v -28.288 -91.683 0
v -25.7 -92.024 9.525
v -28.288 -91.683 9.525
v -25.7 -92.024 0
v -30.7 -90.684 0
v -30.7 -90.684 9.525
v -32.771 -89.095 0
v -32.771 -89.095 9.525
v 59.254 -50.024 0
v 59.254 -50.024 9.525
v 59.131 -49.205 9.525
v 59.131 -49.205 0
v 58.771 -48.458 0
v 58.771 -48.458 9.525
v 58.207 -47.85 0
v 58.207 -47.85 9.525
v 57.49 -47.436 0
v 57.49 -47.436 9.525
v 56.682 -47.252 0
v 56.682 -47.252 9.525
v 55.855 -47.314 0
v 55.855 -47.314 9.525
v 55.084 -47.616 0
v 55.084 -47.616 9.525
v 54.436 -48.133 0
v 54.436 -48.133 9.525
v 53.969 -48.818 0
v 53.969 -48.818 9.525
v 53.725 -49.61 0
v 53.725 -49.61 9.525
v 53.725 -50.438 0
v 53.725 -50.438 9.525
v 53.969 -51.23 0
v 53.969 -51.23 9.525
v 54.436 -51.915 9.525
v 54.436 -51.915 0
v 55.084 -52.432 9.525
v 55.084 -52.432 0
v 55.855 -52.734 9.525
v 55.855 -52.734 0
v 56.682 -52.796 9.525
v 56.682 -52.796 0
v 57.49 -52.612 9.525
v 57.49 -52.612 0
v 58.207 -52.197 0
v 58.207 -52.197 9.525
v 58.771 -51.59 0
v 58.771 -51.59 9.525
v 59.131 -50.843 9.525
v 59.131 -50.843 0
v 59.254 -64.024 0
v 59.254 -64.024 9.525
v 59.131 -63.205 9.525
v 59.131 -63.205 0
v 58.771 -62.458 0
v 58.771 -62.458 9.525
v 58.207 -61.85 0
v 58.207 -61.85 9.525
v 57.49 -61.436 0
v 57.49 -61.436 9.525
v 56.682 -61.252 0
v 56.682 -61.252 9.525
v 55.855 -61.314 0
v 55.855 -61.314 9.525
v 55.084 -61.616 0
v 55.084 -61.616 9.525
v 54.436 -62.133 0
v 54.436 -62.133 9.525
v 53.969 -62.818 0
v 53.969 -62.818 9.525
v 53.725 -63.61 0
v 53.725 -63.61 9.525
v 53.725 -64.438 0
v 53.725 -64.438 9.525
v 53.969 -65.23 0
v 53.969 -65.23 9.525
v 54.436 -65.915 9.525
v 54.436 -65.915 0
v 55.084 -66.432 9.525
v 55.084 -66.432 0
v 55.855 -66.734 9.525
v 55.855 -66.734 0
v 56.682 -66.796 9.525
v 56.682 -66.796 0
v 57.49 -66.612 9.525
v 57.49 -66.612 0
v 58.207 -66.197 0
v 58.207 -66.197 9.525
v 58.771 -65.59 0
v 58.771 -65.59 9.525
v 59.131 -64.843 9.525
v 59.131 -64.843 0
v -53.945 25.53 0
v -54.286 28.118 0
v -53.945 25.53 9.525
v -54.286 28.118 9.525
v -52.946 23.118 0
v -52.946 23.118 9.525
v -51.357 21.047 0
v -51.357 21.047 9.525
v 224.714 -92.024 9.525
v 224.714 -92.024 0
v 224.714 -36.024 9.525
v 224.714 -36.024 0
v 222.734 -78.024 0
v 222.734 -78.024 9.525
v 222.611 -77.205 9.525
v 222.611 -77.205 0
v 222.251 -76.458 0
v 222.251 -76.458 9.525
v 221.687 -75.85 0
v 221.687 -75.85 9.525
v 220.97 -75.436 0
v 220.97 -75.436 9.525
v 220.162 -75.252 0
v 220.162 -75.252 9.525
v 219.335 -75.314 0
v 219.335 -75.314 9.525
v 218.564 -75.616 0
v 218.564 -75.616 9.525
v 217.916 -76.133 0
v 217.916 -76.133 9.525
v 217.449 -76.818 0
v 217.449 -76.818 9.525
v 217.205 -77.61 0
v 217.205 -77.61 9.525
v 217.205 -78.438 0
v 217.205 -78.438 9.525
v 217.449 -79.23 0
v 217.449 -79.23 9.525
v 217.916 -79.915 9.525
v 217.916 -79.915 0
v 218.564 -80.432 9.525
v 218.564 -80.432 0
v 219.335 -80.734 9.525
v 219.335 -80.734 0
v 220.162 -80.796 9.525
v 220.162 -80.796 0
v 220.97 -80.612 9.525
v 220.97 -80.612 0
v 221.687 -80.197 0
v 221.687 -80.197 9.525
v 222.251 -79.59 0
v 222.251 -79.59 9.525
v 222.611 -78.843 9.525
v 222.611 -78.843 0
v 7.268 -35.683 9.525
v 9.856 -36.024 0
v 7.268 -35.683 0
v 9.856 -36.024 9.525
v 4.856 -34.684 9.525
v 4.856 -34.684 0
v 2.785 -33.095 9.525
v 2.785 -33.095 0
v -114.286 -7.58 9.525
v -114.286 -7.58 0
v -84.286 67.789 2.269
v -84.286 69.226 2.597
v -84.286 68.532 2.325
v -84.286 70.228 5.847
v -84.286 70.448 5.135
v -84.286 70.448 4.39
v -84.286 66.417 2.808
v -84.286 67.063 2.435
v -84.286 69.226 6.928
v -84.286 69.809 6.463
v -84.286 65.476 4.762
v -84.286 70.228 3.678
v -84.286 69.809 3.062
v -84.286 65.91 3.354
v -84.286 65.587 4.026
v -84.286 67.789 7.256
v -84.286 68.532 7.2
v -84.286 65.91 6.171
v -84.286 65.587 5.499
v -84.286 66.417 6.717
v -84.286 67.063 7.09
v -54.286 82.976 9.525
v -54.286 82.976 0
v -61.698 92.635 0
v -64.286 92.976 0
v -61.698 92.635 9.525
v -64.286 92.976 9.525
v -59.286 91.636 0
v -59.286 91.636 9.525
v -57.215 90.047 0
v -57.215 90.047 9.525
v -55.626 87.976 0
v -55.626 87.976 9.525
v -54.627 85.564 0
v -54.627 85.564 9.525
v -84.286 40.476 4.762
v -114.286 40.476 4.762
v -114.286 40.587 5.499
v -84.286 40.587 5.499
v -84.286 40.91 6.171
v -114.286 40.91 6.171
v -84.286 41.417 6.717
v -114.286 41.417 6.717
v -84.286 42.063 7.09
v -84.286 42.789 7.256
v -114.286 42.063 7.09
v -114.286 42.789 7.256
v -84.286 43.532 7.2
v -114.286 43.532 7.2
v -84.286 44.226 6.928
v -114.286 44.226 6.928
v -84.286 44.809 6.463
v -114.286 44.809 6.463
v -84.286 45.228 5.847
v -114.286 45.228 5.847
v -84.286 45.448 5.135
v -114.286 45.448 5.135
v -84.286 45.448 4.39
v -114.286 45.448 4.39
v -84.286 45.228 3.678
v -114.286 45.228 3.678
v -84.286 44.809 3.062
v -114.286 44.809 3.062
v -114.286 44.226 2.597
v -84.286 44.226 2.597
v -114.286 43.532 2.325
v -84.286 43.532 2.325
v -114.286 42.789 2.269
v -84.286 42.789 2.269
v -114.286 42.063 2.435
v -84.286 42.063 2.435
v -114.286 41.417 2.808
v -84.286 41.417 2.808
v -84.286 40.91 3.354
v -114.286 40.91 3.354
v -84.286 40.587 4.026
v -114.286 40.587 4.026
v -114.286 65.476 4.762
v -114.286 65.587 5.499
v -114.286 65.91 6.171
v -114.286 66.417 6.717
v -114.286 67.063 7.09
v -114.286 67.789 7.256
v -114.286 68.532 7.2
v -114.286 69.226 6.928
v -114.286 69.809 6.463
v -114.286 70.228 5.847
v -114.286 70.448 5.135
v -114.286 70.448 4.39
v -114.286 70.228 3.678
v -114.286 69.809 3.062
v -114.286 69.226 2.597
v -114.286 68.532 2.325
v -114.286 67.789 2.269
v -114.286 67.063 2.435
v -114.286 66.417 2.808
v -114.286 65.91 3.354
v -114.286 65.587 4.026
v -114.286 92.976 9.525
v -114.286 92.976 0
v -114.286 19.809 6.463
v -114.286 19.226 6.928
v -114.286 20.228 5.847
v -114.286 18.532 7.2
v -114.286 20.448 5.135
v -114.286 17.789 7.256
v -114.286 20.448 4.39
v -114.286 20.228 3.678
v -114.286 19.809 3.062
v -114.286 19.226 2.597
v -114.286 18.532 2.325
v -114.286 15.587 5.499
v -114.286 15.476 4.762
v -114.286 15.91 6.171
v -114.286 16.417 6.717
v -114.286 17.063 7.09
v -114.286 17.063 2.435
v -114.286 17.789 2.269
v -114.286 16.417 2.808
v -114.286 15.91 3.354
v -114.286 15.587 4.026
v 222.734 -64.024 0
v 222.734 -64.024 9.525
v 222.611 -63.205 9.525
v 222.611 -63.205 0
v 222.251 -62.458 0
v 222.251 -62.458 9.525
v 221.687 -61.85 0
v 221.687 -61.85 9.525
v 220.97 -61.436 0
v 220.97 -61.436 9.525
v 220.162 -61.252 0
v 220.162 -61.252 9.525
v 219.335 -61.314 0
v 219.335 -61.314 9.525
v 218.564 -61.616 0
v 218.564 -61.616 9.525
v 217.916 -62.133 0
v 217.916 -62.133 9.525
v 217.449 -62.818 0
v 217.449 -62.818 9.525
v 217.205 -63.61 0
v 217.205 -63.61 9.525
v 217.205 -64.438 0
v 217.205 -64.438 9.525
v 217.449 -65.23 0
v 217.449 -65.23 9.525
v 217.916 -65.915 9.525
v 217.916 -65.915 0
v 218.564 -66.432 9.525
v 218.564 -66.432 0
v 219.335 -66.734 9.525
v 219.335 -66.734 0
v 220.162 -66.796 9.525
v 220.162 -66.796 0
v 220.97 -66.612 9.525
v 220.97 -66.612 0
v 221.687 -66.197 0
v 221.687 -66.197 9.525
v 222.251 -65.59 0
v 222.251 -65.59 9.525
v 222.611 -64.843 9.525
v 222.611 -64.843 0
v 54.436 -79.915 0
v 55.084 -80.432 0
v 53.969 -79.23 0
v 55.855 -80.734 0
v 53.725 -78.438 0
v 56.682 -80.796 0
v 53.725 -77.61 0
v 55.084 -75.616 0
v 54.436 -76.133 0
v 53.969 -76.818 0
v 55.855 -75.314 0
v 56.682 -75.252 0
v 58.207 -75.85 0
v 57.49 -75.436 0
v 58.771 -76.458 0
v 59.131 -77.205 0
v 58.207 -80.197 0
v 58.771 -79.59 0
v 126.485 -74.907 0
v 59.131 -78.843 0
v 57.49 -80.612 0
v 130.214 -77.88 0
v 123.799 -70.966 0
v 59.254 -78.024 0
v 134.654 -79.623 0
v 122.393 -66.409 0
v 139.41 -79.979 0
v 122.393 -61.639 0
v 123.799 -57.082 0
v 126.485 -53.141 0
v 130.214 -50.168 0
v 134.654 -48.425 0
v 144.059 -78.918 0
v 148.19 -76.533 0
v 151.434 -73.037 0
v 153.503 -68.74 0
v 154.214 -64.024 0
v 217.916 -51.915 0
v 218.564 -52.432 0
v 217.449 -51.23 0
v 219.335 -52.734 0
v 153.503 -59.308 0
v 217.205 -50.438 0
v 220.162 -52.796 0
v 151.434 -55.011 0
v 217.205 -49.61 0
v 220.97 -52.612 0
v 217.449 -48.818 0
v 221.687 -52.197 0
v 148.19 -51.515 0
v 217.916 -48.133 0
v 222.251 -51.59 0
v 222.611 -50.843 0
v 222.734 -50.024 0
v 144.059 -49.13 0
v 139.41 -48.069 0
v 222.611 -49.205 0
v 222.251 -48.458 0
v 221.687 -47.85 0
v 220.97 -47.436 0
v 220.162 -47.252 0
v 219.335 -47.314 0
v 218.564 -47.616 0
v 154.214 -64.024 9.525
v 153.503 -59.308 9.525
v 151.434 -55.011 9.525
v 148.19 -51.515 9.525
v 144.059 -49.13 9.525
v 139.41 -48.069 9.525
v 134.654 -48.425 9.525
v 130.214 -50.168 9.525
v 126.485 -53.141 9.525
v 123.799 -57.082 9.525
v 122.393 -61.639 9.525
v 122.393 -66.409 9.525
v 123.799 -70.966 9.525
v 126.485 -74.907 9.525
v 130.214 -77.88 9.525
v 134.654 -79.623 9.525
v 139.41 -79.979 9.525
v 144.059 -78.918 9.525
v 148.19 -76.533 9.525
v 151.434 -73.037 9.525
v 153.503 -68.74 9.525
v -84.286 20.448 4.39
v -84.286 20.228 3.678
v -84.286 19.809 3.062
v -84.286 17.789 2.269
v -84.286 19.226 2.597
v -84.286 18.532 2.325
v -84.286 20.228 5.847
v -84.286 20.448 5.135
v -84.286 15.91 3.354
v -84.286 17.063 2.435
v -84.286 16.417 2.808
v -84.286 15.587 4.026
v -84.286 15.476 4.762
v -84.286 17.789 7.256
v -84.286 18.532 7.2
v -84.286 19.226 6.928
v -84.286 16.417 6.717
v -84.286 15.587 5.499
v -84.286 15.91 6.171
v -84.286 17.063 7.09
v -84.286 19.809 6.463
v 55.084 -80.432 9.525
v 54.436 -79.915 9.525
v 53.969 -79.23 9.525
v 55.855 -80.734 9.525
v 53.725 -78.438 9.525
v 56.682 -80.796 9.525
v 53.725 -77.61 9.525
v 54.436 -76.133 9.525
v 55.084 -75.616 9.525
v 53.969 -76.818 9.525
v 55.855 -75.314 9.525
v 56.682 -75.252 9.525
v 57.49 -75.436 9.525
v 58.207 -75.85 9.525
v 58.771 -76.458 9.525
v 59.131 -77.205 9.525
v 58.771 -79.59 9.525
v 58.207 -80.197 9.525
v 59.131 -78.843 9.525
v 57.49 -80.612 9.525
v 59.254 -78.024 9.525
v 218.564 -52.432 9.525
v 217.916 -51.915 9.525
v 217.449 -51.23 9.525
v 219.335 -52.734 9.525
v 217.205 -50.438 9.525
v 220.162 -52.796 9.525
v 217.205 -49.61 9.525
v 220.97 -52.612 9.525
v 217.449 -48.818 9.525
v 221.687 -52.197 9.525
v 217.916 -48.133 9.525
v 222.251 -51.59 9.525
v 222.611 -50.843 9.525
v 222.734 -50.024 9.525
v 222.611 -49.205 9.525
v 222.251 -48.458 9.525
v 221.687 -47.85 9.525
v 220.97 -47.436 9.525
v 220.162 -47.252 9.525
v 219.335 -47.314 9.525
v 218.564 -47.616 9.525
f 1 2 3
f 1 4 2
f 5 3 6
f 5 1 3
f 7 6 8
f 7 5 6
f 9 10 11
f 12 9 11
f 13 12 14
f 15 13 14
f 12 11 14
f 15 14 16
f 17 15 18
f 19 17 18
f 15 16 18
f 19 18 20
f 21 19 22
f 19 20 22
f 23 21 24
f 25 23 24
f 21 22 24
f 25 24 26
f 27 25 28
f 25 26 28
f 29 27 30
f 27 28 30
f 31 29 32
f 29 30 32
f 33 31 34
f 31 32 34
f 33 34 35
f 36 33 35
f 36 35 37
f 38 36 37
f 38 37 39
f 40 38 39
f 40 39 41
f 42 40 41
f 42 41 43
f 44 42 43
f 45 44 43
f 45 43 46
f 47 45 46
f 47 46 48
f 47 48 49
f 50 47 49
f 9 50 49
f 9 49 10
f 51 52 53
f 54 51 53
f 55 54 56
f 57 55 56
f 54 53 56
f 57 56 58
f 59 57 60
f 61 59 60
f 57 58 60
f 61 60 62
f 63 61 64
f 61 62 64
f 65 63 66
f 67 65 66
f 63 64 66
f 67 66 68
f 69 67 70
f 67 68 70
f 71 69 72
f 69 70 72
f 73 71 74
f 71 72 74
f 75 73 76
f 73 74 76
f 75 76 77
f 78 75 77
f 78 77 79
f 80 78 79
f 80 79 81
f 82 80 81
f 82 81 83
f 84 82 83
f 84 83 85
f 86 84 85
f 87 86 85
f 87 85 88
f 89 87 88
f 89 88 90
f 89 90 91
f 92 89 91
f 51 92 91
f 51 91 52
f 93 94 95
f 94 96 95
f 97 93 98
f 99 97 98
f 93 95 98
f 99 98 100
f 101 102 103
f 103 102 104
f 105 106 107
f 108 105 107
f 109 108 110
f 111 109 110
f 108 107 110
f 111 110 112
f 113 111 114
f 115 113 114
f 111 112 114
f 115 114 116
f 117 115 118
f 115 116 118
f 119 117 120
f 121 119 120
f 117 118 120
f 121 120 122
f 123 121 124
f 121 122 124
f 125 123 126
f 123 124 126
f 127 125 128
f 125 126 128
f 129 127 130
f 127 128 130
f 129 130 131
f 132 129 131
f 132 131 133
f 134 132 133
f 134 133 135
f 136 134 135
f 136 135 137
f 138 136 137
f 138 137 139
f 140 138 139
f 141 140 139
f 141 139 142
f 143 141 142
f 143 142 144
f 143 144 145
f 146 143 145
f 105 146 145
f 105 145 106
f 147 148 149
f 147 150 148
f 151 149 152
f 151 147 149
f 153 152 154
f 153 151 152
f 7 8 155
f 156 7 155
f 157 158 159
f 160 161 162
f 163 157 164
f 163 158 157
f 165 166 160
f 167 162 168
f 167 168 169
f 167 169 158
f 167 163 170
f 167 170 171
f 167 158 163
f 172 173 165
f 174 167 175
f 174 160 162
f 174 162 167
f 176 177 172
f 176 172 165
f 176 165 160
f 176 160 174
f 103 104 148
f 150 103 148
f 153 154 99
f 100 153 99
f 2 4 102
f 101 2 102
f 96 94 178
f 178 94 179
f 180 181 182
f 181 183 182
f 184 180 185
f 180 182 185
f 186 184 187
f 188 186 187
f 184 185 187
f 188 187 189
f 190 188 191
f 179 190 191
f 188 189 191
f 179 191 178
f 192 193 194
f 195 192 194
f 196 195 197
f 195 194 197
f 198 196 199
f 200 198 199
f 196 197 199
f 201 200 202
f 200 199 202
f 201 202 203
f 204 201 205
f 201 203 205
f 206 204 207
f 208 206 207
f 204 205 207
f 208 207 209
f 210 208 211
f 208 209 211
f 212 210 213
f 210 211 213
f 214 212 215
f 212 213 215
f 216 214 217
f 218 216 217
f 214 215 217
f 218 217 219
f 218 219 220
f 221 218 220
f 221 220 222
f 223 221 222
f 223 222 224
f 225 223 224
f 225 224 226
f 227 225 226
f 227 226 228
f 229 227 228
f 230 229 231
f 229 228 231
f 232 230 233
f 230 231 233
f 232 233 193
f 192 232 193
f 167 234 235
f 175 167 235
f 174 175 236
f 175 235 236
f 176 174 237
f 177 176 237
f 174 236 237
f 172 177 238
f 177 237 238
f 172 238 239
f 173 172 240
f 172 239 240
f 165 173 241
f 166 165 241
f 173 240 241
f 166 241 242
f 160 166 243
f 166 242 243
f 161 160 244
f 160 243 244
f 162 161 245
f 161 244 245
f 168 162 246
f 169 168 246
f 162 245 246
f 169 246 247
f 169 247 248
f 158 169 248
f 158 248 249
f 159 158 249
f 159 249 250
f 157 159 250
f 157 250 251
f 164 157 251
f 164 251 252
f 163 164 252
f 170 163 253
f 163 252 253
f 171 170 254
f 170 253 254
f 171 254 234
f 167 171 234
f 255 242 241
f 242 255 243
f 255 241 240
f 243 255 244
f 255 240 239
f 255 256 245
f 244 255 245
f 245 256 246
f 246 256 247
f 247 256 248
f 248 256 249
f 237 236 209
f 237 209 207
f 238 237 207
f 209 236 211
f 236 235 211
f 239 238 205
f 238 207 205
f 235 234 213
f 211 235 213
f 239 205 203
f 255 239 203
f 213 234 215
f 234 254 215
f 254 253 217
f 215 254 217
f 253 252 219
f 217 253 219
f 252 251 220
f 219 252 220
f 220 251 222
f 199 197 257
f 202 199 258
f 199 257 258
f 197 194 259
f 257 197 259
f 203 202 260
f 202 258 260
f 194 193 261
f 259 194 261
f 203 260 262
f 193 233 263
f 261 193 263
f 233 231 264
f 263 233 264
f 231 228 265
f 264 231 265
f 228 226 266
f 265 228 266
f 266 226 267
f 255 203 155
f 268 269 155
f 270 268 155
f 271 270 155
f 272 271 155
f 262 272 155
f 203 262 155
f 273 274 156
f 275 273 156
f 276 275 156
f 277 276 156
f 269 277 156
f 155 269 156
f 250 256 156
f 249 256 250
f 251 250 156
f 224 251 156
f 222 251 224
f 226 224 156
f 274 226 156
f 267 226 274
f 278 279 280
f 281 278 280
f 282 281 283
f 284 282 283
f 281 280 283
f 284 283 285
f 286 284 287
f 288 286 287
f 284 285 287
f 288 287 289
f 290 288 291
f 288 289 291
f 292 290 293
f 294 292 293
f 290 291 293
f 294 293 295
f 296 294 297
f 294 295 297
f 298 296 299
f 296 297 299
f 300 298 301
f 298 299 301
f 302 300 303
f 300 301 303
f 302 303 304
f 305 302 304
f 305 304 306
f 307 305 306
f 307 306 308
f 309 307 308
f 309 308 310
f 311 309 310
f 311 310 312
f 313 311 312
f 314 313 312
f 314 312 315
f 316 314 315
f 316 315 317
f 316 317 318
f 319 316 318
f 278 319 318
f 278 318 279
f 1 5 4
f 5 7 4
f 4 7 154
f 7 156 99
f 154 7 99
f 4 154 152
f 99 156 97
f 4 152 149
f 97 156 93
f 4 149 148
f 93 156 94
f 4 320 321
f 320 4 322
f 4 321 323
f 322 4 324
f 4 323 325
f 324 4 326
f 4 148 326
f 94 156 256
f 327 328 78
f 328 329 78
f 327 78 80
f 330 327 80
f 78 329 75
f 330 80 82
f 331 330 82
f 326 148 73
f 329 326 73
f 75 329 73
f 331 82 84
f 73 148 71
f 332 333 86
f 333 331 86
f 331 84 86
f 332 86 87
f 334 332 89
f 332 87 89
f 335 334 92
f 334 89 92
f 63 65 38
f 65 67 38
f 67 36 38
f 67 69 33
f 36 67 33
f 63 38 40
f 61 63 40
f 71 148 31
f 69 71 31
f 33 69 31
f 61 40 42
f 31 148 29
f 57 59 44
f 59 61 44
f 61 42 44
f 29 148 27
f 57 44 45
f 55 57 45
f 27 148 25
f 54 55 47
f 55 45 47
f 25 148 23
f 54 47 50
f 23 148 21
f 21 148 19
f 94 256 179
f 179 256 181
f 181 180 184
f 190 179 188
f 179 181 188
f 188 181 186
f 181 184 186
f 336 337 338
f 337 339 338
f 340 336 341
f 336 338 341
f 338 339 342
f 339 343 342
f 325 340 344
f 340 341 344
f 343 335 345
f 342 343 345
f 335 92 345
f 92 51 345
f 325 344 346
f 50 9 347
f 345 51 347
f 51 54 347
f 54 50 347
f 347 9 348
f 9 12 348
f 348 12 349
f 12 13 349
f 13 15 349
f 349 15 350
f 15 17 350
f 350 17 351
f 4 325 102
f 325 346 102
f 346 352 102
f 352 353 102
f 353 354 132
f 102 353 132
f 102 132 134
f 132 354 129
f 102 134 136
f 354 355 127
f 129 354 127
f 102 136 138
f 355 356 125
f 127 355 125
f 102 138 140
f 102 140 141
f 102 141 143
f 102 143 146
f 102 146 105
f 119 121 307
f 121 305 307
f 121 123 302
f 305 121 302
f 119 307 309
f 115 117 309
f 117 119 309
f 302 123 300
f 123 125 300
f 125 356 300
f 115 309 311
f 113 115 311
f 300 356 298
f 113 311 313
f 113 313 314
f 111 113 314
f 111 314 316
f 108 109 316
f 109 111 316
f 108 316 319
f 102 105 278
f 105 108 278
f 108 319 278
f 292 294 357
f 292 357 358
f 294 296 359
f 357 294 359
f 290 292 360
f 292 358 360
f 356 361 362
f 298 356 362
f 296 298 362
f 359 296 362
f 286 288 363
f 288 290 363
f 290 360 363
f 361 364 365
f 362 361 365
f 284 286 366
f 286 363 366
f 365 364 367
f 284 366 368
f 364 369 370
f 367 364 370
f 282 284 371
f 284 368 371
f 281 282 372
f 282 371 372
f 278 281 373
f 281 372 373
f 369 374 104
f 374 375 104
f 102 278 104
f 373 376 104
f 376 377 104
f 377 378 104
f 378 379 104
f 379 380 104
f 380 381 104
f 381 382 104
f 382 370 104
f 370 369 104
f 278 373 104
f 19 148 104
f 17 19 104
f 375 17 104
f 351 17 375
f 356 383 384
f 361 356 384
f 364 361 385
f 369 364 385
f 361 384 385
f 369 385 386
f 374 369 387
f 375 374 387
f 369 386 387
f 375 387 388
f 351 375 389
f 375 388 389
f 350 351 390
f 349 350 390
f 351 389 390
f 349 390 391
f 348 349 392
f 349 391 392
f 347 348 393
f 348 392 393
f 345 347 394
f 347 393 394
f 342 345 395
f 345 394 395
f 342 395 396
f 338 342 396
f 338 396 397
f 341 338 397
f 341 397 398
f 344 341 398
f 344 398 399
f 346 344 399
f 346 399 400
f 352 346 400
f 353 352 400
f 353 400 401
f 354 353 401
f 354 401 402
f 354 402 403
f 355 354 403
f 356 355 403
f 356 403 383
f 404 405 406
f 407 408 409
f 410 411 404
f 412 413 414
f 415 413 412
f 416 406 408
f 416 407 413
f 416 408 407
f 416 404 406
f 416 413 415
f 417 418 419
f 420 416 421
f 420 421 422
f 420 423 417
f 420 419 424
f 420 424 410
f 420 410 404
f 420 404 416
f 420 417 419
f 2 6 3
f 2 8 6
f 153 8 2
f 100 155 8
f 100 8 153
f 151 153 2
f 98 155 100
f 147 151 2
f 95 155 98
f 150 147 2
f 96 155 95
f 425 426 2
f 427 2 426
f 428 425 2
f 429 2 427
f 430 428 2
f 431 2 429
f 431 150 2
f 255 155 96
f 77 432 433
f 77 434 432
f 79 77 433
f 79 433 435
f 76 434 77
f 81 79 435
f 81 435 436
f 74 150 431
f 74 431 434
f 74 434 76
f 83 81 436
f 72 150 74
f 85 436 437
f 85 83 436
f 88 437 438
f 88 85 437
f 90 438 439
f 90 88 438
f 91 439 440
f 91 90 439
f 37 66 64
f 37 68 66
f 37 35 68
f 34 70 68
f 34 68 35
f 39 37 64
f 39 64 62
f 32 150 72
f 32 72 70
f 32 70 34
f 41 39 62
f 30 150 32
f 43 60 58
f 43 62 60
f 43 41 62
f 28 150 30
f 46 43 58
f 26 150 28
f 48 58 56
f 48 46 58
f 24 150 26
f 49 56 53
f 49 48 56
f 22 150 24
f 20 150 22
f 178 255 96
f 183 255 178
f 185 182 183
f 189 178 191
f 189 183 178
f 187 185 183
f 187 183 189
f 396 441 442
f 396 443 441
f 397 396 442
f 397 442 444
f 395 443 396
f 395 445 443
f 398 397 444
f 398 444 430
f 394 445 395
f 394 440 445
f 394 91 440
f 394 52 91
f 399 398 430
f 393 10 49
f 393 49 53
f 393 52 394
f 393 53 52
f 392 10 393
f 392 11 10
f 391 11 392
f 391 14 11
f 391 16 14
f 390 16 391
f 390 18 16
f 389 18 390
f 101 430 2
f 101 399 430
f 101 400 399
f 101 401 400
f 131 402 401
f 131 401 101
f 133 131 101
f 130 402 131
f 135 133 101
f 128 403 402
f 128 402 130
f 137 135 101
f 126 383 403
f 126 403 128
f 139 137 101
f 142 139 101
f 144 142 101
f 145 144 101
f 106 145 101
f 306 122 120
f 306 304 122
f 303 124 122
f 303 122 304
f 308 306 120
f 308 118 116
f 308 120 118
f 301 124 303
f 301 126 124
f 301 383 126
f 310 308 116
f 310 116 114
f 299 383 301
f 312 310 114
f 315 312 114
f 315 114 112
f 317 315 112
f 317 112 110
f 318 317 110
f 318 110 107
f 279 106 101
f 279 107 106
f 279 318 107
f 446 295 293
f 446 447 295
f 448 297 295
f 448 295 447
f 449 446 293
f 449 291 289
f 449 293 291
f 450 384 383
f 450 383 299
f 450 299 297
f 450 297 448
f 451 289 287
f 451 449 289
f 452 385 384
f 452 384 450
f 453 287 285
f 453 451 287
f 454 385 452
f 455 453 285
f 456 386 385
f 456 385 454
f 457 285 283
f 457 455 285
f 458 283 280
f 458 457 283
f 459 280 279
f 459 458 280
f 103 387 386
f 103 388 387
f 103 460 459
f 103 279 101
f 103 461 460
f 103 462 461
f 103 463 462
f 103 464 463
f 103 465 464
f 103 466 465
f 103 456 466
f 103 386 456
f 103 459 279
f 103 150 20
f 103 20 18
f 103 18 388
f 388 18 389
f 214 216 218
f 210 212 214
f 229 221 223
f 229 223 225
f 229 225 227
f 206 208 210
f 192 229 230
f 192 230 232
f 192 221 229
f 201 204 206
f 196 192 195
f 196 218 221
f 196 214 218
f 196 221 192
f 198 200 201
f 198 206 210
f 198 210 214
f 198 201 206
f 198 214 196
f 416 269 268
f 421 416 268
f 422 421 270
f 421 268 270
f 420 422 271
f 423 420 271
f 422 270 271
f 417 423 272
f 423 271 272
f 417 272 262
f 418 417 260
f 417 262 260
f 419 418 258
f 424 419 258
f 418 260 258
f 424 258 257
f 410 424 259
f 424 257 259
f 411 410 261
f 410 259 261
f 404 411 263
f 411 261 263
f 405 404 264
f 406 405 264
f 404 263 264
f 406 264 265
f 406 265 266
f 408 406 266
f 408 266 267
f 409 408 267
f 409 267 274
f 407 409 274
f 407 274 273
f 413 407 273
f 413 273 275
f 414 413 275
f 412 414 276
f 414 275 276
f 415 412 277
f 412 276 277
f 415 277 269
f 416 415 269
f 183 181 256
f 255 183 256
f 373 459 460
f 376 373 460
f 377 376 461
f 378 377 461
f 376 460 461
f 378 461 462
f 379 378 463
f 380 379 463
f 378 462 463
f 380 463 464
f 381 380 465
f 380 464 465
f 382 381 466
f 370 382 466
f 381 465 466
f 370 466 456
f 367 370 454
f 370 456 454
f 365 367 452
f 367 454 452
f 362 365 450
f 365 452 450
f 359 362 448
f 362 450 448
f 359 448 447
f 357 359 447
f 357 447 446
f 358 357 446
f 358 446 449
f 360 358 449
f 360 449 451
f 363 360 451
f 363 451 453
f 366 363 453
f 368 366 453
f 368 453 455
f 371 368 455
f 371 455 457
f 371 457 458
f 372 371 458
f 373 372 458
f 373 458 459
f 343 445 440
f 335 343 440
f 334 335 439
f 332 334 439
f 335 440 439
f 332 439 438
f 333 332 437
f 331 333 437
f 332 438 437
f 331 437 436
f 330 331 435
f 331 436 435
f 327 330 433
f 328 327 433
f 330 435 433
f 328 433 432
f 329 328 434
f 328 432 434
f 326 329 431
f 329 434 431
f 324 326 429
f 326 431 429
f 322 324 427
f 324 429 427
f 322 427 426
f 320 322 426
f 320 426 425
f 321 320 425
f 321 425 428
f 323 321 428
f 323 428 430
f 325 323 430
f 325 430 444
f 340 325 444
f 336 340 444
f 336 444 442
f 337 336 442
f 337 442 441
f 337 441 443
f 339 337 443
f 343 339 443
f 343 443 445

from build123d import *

# Parameters (mm, degrees)
RESSALTO_EXTRUS_O1_DEPTH = 9.525
ESBO_O3_R                = 16
CIRCULO_ROLAMENTO_DEPTH  = 10
ESBO_O6_R                = 2.5
CORTE_EXTRUS_O4_DEPTH    = 30
CORTE_EXTRUS_O6_DEPTH    = 10
ESBO_O10_R               = 2.78
CORTE_EXTRUS_O7_DEPTH    = 10
FILETE1_R                = 10
ESBO_O12_R               = 2.78
CORTE_EXTRUS_O8_DEPTH    = 10


with BuildPart() as part:
    # Esboço1 → Ressalto-extrusão1 (new body)
    with BuildSketch(Plane.XY):
        Polygon((-114.28595772, -92.023971813), (224.71404228, -92.023971813), (224.71404228, -36.023971813), (5.71404228, -36.023971813), (-54.28595772, 23.976028187), (-54.28595772, 92.976028187), (-114.28595772, 92.976028187), align=None)
    extrude(amount=RESSALTO_EXTRUS_O1_DEPTH)

    # Esboço3 → Circulo rolamento (cut)
    with BuildSketch(Plane.XY.offset(9.525)):
        with Locations((138.21404228, -64.023971813)):
            Circle(ESBO_O3_R)
    extrude(amount=-CIRCULO_ROLAMENTO_DEPTH, mode=Mode.SUBTRACT)

    # Esboço6 → Corte-extrusão4 (cut)
    with BuildSketch(Plane.ZY.offset(114.28595772)):
        with Locations(Location((4.7625, 67.976028187, 0), (0, 0, 270))):
            Circle(ESBO_O6_R)
        with Locations(Location((4.7625, 42.976028187, 0), (0, 0, 270))):
            Circle(ESBO_O6_R)
        with Locations(Location((4.7625, 17.976028187, 0), (0, 0, 270))):
            Circle(ESBO_O6_R)
    extrude(amount=-CORTE_EXTRUS_O4_DEPTH, mode=Mode.SUBTRACT)

    # Esboço9 → Corte-extrusão6 (cut)
    with BuildSketch(Plane.XY.offset(9.525)):
        Polygon((-29.841868762, -92.023971813), (-114.28595772, -7.579882856), (-114.28595772, -92.023971813), align=None)
    extrude(amount=-CORTE_EXTRUS_O6_DEPTH, mode=Mode.SUBTRACT)

    # Esboço10 → Corte-extrusão7 (cut)
    with BuildSketch(Plane.XY.offset(9.525)):
        with Locations((56.47404228, -50.023971813)):
            Circle(ESBO_O10_R)
        with Locations((56.47404228, -64.023971813)):
            Circle(ESBO_O10_R)
        with Locations((56.47404228, -78.023971813)):
            Circle(ESBO_O10_R)
    extrude(amount=-CORTE_EXTRUS_O7_DEPTH, mode=Mode.SUBTRACT)

    # Filete1
    filete1_edges = [part.edges().sort_by_distance(p)[0] for p in [
        (-54.28595772, 92.976028187, 4.7625),
        (-54.28595772, 23.976028187, 4.7625),
        (5.71404228, -36.023971813, 4.7625),
        (-29.841868762, -92.023971813, 4.7625),
    ]]
    fillet(filete1_edges, radius=FILETE1_R)

    # Esboço12 → Corte-extrusão8 (cut)
    with BuildSketch(Plane.XY.offset(9.525)):
        with Locations((219.95404228, -78.023971813)):
            Circle(ESBO_O12_R)
        with Locations((219.95404228, -64.023971813)):
            Circle(ESBO_O12_R)
        with Locations((219.95404228, -50.023971813)):
            Circle(ESBO_O12_R)
    extrude(amount=-CORTE_EXTRUS_O8_DEPTH, mode=Mode.SUBTRACT)


solid = part.part
